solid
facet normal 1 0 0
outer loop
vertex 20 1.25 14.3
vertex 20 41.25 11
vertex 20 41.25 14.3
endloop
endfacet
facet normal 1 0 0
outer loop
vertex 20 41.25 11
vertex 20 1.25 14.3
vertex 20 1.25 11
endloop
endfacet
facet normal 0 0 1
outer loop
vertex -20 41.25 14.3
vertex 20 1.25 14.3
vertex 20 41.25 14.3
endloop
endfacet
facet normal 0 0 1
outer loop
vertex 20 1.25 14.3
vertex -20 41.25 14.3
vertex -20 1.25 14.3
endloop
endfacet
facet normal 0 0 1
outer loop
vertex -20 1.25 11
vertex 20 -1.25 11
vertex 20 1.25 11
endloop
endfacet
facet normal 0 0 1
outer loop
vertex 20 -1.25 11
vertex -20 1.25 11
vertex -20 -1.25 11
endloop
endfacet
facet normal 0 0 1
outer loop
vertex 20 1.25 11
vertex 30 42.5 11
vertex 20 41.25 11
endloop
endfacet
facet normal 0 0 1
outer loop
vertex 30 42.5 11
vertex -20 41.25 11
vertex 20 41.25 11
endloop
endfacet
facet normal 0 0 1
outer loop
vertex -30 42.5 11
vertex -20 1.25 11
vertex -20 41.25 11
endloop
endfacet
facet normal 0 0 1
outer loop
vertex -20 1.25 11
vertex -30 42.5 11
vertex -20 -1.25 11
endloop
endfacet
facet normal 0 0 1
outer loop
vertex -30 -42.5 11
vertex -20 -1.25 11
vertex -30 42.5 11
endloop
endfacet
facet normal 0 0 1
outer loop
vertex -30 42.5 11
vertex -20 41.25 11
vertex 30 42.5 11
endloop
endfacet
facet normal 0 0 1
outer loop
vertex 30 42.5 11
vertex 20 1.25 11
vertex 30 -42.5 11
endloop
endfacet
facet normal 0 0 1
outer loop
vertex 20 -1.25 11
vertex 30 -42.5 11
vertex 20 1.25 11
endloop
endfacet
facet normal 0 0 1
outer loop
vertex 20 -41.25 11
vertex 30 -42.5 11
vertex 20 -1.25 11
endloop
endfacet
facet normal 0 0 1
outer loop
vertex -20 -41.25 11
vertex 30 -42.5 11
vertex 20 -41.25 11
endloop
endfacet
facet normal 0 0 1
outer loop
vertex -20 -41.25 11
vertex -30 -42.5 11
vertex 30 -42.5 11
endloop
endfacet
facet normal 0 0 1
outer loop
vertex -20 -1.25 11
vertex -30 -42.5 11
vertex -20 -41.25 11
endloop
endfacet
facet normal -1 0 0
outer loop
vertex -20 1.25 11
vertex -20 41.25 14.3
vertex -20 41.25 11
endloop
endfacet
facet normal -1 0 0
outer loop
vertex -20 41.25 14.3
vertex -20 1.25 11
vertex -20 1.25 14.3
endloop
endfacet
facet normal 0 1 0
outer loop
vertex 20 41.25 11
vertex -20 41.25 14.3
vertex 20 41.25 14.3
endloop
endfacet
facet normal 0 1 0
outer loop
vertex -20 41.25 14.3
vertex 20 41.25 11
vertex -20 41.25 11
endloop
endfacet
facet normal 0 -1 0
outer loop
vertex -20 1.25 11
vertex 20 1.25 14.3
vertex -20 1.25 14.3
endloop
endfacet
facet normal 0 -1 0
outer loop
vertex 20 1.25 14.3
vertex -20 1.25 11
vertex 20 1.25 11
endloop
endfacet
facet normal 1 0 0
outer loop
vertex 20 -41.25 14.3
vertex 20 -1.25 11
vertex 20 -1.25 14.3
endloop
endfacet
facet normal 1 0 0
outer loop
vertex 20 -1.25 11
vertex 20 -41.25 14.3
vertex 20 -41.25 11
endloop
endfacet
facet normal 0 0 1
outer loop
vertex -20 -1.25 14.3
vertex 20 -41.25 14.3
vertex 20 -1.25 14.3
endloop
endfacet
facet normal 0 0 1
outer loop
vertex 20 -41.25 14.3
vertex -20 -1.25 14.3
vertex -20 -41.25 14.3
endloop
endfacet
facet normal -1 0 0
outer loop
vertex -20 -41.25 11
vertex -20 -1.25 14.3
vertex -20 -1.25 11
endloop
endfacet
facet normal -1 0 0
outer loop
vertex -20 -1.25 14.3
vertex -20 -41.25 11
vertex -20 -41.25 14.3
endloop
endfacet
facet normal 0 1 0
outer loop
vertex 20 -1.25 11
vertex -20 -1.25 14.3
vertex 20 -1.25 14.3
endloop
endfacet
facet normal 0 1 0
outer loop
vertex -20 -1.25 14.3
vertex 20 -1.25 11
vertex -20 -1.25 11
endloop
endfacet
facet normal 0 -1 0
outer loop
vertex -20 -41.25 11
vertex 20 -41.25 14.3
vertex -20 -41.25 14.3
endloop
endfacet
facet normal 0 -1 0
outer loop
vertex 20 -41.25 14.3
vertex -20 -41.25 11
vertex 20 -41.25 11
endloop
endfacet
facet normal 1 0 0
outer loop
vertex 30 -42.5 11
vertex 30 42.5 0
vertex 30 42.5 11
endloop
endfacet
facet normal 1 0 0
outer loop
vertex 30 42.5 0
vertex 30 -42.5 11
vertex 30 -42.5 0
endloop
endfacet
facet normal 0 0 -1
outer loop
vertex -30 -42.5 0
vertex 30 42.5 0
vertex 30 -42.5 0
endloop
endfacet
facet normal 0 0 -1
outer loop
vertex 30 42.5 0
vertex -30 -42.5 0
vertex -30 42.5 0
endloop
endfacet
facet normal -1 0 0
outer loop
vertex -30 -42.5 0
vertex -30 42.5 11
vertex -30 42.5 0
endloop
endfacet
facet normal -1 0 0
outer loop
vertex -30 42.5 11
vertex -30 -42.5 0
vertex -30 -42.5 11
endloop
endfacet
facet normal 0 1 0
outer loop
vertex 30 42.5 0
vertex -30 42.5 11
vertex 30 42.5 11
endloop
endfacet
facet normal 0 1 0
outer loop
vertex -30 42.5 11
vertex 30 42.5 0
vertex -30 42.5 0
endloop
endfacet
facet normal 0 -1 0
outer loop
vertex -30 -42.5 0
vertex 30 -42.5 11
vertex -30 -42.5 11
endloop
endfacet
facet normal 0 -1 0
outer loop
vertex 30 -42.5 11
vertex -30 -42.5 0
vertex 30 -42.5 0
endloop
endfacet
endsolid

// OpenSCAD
// file: aux.scad
module quad(x, y){
    translate([x, y, 0])
        children();
    translate([x, -y, 0])
        children();
    translate([-x, y, 0])
        children();
    translate([-x, -y, 0])
        children();
}

module xycube(v){
	translate([-v[0]/2, -v[1]/2, 0])
		cube(v);
}
// file: dimensions.scad
//This file contains all the input dimensions


//Interface to CPU-cooler
cooler_interface_x = 40;
cooler_interface_y = 40;
cooler_interface_z = 3;
cooler_hole_pattern_x_sep=80;
cooler_hole_pattern_y_sep=80;
cooler_thread_radius = 2;

//Size of peltier
tec1_12710_x = 40;
tec1_12710_y = 40;
tec1_12710_z = 3.3;


//Dimensions of each layer
tec4_24606_l1_x = 40;
tec4_24606_l1_y = 40;
tec4_24606_l1_z = 2.95;
tec4_24606_l2_x = 30;
tec4_24606_l2_y = 30;
tec4_24606_l2_z = 2.95;
tec4_24606_l3_x = 20;
tec4_24606_l3_y = 20;
tec4_24606_l3_z = 2.95;
tec4_24606_l4_x = 15;
tec4_24606_l4_y = 15;
tec4_24606_l4_z = 2.95;

//Outer dimension of four stack
tec4_24606_x = tec4_24606_l1_x;
tec4_24606_y = tec4_24606_l1_y;
tec4_24606_z = tec4_24606_l1_z + tec4_24606_l2_z + tec4_24606_l3_z + tec4_24606_l4_z;

copper_base_margin_y = 5;
copper_base_x = 60;
copper_base_y = tec1_12710_y*2+copper_base_margin_y;
copper_base_z = 11;
// file: peltiers.scad
include <dimensions.scad>

module peltier_tec1_12710(){
    color([1,1,1])
    xycube([tec1_12710_x, tec1_12710_y,tec1_12710_z]);
}




module peltier_tec4_24606()
{
    color([1,1,1]) cube([tec4_24606_l1_x, tec4_24606_l1_y,tec4_24606_l1_z]);
    translate([(tec4_24606_l1_x-tec4_24606_l2_x)/2, (tec4_24606_l1_x-tec4_24606_l2_x)/2, tec4_24606_l1_z]){
        color([1,1,1]) cube([tec4_24606_l2_x, tec4_24606_l2_y,tec4_24606_l2_z]);
        translate([(tec4_24606_l2_x-tec4_24606_l3_x)/2, (tec4_24606_l2_x-tec4_24606_l3_x)/2, tec4_24606_l2_z]){
            color([1,1,1]) cube([tec4_24606_l3_x, tec4_24606_l3_y,tec4_24606_l3_z]);
            translate([(tec4_24606_l3_x-tec4_24606_l4_x)/2, (tec4_24606_l3_x-tec4_24606_l4_x)/2, tec4_24606_l4_z]){
                color([1,1,1]) cube([tec4_24606_l4_x, tec4_24606_l4_y,tec4_24606_l4_z]);
            }
        }
    }
}
// file: MetalParts.scad
include <dimensions.scad>
include <aux.scad>
module copper_base(){
	color([1,0.5, 0.2])
	xycube([copper_base_x, copper_base_y, copper_base_z]);
}

module translate_to_copper_base(){
	translate([0, 0, copper_base_z]) children();
}

//copper_base();
// main file
include <MetalParts.scad>
include <peltiers.scad>

copper_base();
translate_to_copper_base(){
	translate([0, tec1_12710_y/2+copper_base_margin_y/4, 0])
		peltier_tec1_12710();
	translate([0, -tec1_12710_y/2-copper_base_margin_y/4, 0])
		peltier_tec1_12710();
}
